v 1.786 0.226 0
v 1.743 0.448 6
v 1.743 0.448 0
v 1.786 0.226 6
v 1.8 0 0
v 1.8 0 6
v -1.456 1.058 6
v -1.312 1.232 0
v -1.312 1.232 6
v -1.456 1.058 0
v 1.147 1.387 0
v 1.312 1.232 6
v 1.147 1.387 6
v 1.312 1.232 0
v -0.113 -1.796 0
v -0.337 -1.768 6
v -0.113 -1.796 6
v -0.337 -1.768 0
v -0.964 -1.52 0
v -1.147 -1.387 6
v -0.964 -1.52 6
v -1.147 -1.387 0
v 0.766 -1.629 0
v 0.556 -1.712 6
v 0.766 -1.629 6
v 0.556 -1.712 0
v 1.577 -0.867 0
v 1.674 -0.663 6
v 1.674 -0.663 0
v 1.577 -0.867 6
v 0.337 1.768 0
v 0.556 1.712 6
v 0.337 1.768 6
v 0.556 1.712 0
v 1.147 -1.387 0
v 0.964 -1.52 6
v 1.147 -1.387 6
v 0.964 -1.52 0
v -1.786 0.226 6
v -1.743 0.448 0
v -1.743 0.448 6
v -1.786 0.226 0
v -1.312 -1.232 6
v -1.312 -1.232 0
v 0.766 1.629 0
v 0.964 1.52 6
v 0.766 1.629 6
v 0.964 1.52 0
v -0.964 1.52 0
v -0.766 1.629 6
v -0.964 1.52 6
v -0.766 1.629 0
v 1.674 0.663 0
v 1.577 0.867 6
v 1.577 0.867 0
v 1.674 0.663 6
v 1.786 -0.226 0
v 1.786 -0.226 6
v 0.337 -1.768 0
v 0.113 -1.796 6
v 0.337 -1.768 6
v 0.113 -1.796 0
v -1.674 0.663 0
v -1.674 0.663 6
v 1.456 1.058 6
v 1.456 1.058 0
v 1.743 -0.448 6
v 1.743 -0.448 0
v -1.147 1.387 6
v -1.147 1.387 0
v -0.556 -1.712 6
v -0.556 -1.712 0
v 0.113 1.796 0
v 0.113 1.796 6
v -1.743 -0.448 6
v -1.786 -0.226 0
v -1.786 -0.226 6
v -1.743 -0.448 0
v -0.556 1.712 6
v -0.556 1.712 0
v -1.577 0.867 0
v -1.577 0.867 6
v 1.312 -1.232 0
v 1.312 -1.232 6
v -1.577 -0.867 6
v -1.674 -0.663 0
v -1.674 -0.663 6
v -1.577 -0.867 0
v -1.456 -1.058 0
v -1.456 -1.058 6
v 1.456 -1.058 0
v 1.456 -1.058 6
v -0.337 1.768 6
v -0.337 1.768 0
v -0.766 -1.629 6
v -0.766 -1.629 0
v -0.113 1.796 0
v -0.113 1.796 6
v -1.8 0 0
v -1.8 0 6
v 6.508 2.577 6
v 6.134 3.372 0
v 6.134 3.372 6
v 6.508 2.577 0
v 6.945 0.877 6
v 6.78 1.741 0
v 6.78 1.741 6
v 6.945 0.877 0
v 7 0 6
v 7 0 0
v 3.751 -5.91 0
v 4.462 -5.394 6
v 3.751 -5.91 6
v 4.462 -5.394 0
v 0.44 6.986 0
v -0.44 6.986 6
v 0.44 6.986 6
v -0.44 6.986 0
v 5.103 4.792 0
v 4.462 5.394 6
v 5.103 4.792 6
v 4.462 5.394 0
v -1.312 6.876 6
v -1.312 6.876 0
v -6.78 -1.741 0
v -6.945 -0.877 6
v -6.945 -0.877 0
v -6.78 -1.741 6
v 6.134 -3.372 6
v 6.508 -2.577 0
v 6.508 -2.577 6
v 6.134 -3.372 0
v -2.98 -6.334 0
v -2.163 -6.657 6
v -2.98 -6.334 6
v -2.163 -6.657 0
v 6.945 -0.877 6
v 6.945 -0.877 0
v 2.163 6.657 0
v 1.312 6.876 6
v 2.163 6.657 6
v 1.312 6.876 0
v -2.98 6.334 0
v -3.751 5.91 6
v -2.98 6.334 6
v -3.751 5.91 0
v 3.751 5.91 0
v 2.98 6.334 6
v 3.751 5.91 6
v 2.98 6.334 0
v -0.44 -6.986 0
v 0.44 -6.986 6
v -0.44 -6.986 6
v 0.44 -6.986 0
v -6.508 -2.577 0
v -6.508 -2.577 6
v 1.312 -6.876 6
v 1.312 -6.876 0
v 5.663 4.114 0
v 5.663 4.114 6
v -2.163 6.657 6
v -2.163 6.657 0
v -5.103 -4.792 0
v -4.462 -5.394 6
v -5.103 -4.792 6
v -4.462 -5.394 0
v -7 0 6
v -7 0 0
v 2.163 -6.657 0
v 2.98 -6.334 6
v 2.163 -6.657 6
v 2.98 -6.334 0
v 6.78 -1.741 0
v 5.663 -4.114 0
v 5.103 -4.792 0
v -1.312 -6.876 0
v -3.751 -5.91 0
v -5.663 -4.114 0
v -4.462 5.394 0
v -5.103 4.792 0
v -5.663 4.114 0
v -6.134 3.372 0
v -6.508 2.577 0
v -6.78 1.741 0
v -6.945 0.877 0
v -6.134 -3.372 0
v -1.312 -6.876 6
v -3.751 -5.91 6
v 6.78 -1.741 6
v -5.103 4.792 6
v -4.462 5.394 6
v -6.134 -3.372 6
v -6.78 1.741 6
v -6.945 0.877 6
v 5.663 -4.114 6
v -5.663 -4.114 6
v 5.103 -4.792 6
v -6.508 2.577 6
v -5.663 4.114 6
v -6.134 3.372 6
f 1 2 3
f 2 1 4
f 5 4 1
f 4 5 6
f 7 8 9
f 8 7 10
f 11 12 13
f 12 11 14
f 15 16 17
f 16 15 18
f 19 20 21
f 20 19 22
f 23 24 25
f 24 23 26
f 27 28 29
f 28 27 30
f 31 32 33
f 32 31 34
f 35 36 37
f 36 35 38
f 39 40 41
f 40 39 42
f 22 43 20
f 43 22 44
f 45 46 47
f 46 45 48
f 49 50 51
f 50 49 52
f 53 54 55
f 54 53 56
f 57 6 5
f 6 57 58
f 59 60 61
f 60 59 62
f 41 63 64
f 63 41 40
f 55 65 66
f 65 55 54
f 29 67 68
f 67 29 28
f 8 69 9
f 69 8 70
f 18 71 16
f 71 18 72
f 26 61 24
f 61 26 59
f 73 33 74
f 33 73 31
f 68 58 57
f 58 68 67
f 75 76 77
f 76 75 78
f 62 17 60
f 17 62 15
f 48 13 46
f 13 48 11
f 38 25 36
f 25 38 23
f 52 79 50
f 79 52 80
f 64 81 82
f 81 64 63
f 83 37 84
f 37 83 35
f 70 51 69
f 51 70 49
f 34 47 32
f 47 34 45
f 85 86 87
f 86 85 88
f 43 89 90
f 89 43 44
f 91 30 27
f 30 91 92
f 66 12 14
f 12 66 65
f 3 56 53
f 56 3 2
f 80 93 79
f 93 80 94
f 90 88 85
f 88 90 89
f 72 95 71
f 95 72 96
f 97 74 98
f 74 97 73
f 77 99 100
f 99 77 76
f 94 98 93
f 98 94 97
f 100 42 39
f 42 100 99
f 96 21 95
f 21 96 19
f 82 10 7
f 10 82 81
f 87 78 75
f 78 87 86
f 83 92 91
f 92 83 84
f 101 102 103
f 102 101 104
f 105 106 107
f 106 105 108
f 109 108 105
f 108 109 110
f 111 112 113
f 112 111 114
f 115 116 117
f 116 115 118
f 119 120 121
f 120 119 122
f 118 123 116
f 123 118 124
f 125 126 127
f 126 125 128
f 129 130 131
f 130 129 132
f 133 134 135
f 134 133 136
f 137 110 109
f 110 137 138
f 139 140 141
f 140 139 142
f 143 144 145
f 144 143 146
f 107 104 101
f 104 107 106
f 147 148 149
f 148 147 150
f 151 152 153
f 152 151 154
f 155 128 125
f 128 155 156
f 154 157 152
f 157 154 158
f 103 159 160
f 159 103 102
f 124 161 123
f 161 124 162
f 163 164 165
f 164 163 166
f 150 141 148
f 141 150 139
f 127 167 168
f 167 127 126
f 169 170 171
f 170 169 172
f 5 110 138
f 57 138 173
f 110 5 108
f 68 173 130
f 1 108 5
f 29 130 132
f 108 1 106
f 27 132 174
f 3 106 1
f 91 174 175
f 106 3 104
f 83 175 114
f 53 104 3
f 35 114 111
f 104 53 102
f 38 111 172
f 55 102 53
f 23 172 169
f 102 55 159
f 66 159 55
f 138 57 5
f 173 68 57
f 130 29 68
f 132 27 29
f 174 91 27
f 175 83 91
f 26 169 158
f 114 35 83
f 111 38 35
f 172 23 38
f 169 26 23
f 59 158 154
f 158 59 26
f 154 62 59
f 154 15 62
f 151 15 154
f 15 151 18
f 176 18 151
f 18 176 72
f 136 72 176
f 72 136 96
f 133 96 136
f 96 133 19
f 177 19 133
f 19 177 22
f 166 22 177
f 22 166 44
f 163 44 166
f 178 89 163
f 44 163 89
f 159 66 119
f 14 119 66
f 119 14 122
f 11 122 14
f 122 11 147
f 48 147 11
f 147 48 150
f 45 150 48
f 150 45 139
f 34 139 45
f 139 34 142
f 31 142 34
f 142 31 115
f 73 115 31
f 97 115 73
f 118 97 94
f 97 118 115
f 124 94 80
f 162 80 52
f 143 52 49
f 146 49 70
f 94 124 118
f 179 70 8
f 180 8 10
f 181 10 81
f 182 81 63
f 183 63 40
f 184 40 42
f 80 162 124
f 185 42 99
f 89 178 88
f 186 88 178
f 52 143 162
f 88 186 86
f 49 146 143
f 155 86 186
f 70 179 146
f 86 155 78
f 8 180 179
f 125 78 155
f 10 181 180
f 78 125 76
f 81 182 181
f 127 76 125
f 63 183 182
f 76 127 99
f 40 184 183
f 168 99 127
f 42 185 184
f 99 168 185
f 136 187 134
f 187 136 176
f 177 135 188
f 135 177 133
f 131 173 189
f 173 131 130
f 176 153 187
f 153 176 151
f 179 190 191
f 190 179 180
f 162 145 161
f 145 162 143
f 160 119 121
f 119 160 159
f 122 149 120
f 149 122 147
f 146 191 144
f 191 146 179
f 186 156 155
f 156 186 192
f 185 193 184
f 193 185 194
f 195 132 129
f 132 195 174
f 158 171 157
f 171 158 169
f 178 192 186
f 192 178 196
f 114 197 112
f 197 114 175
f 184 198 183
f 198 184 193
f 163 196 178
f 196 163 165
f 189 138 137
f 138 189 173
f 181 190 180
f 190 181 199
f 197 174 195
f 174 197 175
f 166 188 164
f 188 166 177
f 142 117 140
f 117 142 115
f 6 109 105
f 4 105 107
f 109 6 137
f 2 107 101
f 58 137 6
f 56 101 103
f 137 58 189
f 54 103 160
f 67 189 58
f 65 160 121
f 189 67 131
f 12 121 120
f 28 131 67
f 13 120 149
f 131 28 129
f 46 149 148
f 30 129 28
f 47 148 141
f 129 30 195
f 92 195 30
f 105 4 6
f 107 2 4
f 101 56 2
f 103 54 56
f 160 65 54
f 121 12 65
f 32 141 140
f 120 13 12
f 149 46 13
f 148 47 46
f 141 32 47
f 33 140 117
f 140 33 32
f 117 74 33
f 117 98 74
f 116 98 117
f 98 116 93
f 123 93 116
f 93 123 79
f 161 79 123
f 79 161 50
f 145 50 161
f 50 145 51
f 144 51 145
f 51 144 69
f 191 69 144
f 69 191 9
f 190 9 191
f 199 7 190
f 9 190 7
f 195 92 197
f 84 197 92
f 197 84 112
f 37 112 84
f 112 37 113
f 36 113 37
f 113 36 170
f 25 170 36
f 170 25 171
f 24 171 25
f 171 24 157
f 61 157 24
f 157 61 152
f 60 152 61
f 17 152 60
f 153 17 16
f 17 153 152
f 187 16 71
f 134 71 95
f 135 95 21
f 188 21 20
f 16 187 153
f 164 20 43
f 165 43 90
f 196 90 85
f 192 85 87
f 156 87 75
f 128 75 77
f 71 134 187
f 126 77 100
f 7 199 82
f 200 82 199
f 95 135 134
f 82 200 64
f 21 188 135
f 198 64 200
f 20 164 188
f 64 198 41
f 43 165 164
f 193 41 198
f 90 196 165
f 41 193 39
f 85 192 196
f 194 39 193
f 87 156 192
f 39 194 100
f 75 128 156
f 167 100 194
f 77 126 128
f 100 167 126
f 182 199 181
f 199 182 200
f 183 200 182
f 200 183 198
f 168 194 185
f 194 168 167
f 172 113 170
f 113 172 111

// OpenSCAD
$fn = 50;


difference() {
	union() {
		cylinder(h = 6, r = 7.0000000000);
	}
	union() {
		translate(v = [0, 0, -100]) {
			cylinder(h = 200, r = 1.8000000000);
		}
		translate(v = [0, 0, -100]) {
			cylinder(h = 200, r = 1.8000000000);
		}
	}
}
